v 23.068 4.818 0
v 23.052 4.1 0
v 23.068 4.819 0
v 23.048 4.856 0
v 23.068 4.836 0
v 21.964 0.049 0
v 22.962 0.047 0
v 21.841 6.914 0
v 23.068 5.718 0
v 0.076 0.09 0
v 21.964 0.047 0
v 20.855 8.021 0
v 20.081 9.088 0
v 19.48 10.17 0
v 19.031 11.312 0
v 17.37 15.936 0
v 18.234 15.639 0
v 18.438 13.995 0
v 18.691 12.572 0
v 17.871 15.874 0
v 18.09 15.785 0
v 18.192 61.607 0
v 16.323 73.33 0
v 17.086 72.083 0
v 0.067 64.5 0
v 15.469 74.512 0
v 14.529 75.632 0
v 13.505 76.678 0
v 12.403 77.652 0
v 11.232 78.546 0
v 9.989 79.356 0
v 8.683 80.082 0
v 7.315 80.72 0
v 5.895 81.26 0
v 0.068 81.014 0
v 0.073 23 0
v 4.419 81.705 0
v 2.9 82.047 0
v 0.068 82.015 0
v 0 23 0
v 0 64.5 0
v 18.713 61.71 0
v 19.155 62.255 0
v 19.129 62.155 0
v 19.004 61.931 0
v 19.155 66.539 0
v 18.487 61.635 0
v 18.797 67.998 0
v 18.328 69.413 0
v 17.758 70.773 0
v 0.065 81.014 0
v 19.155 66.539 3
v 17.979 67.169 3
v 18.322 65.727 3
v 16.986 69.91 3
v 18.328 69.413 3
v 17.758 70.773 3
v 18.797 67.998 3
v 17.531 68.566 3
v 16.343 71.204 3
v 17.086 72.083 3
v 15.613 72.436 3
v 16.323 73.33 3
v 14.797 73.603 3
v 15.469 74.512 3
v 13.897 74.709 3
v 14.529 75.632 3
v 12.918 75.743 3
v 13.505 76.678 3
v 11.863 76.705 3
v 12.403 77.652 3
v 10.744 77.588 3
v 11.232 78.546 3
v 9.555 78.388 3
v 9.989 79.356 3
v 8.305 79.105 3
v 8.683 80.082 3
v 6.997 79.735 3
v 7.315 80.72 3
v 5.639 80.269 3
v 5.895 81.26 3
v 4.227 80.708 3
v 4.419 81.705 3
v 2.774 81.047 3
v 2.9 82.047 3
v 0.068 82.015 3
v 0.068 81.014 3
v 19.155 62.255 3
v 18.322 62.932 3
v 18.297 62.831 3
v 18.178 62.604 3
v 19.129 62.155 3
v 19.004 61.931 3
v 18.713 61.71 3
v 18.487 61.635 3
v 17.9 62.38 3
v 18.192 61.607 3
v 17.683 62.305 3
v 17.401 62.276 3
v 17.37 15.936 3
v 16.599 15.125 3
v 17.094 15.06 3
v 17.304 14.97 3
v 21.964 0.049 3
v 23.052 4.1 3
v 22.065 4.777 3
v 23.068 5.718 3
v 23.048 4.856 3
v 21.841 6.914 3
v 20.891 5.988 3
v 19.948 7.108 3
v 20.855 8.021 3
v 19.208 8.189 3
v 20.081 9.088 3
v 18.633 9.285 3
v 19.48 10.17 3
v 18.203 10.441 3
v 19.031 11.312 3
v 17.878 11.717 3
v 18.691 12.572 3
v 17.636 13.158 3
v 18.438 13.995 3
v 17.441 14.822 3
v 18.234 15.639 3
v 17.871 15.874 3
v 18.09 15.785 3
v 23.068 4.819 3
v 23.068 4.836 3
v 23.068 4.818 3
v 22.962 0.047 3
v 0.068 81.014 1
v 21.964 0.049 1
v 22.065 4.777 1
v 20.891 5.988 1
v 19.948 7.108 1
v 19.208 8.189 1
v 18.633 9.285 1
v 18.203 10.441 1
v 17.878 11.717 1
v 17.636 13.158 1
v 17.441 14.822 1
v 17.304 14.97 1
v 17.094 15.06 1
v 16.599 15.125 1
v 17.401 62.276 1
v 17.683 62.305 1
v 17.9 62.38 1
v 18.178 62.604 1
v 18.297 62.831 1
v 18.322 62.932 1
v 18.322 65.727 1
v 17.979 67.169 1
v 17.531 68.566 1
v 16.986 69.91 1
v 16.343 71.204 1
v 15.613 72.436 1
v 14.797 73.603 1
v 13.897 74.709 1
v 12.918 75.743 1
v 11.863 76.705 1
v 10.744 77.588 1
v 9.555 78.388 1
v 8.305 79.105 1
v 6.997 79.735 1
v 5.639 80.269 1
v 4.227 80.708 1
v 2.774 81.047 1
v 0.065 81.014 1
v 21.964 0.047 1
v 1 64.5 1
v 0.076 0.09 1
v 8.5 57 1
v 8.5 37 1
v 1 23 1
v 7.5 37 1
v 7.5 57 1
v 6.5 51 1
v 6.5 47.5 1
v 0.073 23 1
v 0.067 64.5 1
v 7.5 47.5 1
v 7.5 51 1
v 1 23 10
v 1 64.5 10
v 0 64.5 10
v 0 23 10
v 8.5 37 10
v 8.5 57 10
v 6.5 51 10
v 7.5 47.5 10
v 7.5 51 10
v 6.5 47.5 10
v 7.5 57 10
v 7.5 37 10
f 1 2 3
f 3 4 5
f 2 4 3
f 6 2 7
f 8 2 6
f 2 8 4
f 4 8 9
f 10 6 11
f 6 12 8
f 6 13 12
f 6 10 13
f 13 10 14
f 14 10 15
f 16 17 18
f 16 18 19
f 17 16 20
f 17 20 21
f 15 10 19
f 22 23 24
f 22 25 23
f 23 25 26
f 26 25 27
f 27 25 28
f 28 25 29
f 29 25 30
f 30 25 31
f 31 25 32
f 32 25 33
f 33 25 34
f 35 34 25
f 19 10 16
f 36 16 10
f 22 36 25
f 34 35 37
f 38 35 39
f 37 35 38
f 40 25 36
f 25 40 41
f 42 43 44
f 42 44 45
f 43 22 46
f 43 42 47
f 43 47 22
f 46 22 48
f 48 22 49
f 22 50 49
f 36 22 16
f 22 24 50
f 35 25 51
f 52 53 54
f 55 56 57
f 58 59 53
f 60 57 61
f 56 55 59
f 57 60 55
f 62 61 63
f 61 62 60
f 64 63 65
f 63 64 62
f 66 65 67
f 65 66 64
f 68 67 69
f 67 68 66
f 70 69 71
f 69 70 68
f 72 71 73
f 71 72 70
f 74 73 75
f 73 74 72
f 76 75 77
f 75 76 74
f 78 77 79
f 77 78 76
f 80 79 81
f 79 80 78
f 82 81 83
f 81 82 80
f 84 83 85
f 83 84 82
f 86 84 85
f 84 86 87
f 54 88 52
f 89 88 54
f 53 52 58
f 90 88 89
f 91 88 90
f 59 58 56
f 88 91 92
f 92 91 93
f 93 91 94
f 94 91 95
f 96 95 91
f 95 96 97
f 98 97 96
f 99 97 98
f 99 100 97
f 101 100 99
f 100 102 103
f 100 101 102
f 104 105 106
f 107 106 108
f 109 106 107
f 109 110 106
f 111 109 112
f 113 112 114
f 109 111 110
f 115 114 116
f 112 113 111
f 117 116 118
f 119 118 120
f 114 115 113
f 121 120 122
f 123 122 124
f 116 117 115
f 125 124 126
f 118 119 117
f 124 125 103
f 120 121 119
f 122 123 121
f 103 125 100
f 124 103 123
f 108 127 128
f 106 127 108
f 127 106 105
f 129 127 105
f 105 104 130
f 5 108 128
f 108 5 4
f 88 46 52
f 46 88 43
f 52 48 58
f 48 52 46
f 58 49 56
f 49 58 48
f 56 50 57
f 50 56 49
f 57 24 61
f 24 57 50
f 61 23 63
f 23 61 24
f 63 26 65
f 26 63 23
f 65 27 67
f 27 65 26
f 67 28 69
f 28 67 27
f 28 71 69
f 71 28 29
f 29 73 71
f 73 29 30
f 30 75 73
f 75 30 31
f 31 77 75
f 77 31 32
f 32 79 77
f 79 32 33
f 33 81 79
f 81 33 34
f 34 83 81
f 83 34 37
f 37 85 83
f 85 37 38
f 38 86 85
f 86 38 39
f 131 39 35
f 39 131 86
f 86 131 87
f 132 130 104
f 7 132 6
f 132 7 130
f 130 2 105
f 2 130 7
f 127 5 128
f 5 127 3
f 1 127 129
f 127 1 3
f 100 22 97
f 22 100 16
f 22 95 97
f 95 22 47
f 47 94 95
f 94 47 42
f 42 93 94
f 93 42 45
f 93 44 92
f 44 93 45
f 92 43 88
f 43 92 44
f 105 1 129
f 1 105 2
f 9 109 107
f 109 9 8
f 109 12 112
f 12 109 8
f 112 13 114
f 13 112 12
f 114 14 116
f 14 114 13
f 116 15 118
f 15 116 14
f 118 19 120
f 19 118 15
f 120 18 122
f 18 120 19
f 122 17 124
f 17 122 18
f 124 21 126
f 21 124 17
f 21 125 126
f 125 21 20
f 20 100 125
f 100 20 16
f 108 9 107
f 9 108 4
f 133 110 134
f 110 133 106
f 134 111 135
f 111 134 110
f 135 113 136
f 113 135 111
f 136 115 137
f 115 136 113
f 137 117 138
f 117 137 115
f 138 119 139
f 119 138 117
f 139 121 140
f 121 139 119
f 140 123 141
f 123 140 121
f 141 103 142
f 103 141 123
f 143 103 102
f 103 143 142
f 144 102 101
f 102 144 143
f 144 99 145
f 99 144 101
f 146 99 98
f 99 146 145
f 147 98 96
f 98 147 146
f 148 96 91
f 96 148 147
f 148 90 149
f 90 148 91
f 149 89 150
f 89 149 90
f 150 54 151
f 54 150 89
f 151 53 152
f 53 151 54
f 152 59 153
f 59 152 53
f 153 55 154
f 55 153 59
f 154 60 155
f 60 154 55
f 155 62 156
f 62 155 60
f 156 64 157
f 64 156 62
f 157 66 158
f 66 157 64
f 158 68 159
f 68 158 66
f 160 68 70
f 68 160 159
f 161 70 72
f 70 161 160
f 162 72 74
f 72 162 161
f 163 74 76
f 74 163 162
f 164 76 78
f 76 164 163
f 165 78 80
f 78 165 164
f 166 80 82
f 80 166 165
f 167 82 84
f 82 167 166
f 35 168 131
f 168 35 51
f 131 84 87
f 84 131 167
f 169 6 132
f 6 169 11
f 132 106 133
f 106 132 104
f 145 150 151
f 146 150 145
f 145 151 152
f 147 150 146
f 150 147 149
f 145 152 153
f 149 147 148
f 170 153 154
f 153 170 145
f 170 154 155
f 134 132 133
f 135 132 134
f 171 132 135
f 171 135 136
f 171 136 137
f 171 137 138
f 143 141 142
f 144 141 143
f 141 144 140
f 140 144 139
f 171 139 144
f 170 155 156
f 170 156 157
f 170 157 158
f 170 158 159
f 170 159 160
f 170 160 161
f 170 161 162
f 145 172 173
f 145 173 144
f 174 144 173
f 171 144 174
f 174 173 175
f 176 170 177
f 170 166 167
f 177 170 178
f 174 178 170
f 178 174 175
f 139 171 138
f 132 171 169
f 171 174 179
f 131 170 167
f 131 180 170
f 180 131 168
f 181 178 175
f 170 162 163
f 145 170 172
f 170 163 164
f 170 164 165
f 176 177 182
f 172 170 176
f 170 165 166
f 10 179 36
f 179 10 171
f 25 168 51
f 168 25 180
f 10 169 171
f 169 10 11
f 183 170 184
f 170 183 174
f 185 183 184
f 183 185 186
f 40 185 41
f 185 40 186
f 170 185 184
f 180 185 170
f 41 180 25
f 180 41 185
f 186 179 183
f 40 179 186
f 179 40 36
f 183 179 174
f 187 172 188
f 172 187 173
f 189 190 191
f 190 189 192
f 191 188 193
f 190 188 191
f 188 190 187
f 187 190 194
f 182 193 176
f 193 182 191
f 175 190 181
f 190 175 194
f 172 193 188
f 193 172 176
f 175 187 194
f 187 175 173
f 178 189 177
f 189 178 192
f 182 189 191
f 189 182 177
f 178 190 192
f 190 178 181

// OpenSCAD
module shape() {
     resize([22, 81]) translate([-98.89, -64.6, 0]) mirror() polygon([[-104.97, 64.613], [-104.998, 65.926], [-104.673, 66.262], [-104.412, 66.573], [-104.207, 66.873], [-104.048, 67.177], [-103.929, 67.498], [-103.839, 67.852], [-103.772, 68.252], [-103.718, 68.714], [-103.68, 68.755], [-103.622, 68.78], [-103.485, 68.798], [-103.707, 81.885], [-103.785, 81.893], [-103.845, 81.914], [-103.922, 81.976], [-103.955, 82.039], [-103.962, 82.067], [-103.962, 82.843], [-103.867, 83.243], [-103.743, 83.631], [-103.592, 84.004], [-103.414, 84.363], [-103.212, 84.705], [-102.986, 85.029], [-102.737, 85.336], [-102.466, 85.623], [-102.174, 85.89], [-101.864, 86.135], [-101.535, 86.357], [-101.189, 86.556], [-100.827, 86.731], [-100.451, 86.879], [-100.06, 87.001], [-99.658, 87.095], [-98.908, 87.086], [-98.911, 64.625]]);
}

difference() {
     union() {
          linear_extrude(3) resize([23, 82]) shape();
          translate([0, 0.1, 0]) linear_extrude(3) resize([23, 80]) shape();
          translate([0, 1, 0]) linear_extrude(3) resize([23, 80]) shape();
     }
     linear_extrude(3) shape();
}

linear_extrude(1) shape();

translate([0, 23, 0]) cube([1, 41.5, 10]);
translate([7.5, 37, 0]) cube([1, 20, 10]);
translate([6.5, 47.5, 0]) cube([1, 3.5, 10]);
